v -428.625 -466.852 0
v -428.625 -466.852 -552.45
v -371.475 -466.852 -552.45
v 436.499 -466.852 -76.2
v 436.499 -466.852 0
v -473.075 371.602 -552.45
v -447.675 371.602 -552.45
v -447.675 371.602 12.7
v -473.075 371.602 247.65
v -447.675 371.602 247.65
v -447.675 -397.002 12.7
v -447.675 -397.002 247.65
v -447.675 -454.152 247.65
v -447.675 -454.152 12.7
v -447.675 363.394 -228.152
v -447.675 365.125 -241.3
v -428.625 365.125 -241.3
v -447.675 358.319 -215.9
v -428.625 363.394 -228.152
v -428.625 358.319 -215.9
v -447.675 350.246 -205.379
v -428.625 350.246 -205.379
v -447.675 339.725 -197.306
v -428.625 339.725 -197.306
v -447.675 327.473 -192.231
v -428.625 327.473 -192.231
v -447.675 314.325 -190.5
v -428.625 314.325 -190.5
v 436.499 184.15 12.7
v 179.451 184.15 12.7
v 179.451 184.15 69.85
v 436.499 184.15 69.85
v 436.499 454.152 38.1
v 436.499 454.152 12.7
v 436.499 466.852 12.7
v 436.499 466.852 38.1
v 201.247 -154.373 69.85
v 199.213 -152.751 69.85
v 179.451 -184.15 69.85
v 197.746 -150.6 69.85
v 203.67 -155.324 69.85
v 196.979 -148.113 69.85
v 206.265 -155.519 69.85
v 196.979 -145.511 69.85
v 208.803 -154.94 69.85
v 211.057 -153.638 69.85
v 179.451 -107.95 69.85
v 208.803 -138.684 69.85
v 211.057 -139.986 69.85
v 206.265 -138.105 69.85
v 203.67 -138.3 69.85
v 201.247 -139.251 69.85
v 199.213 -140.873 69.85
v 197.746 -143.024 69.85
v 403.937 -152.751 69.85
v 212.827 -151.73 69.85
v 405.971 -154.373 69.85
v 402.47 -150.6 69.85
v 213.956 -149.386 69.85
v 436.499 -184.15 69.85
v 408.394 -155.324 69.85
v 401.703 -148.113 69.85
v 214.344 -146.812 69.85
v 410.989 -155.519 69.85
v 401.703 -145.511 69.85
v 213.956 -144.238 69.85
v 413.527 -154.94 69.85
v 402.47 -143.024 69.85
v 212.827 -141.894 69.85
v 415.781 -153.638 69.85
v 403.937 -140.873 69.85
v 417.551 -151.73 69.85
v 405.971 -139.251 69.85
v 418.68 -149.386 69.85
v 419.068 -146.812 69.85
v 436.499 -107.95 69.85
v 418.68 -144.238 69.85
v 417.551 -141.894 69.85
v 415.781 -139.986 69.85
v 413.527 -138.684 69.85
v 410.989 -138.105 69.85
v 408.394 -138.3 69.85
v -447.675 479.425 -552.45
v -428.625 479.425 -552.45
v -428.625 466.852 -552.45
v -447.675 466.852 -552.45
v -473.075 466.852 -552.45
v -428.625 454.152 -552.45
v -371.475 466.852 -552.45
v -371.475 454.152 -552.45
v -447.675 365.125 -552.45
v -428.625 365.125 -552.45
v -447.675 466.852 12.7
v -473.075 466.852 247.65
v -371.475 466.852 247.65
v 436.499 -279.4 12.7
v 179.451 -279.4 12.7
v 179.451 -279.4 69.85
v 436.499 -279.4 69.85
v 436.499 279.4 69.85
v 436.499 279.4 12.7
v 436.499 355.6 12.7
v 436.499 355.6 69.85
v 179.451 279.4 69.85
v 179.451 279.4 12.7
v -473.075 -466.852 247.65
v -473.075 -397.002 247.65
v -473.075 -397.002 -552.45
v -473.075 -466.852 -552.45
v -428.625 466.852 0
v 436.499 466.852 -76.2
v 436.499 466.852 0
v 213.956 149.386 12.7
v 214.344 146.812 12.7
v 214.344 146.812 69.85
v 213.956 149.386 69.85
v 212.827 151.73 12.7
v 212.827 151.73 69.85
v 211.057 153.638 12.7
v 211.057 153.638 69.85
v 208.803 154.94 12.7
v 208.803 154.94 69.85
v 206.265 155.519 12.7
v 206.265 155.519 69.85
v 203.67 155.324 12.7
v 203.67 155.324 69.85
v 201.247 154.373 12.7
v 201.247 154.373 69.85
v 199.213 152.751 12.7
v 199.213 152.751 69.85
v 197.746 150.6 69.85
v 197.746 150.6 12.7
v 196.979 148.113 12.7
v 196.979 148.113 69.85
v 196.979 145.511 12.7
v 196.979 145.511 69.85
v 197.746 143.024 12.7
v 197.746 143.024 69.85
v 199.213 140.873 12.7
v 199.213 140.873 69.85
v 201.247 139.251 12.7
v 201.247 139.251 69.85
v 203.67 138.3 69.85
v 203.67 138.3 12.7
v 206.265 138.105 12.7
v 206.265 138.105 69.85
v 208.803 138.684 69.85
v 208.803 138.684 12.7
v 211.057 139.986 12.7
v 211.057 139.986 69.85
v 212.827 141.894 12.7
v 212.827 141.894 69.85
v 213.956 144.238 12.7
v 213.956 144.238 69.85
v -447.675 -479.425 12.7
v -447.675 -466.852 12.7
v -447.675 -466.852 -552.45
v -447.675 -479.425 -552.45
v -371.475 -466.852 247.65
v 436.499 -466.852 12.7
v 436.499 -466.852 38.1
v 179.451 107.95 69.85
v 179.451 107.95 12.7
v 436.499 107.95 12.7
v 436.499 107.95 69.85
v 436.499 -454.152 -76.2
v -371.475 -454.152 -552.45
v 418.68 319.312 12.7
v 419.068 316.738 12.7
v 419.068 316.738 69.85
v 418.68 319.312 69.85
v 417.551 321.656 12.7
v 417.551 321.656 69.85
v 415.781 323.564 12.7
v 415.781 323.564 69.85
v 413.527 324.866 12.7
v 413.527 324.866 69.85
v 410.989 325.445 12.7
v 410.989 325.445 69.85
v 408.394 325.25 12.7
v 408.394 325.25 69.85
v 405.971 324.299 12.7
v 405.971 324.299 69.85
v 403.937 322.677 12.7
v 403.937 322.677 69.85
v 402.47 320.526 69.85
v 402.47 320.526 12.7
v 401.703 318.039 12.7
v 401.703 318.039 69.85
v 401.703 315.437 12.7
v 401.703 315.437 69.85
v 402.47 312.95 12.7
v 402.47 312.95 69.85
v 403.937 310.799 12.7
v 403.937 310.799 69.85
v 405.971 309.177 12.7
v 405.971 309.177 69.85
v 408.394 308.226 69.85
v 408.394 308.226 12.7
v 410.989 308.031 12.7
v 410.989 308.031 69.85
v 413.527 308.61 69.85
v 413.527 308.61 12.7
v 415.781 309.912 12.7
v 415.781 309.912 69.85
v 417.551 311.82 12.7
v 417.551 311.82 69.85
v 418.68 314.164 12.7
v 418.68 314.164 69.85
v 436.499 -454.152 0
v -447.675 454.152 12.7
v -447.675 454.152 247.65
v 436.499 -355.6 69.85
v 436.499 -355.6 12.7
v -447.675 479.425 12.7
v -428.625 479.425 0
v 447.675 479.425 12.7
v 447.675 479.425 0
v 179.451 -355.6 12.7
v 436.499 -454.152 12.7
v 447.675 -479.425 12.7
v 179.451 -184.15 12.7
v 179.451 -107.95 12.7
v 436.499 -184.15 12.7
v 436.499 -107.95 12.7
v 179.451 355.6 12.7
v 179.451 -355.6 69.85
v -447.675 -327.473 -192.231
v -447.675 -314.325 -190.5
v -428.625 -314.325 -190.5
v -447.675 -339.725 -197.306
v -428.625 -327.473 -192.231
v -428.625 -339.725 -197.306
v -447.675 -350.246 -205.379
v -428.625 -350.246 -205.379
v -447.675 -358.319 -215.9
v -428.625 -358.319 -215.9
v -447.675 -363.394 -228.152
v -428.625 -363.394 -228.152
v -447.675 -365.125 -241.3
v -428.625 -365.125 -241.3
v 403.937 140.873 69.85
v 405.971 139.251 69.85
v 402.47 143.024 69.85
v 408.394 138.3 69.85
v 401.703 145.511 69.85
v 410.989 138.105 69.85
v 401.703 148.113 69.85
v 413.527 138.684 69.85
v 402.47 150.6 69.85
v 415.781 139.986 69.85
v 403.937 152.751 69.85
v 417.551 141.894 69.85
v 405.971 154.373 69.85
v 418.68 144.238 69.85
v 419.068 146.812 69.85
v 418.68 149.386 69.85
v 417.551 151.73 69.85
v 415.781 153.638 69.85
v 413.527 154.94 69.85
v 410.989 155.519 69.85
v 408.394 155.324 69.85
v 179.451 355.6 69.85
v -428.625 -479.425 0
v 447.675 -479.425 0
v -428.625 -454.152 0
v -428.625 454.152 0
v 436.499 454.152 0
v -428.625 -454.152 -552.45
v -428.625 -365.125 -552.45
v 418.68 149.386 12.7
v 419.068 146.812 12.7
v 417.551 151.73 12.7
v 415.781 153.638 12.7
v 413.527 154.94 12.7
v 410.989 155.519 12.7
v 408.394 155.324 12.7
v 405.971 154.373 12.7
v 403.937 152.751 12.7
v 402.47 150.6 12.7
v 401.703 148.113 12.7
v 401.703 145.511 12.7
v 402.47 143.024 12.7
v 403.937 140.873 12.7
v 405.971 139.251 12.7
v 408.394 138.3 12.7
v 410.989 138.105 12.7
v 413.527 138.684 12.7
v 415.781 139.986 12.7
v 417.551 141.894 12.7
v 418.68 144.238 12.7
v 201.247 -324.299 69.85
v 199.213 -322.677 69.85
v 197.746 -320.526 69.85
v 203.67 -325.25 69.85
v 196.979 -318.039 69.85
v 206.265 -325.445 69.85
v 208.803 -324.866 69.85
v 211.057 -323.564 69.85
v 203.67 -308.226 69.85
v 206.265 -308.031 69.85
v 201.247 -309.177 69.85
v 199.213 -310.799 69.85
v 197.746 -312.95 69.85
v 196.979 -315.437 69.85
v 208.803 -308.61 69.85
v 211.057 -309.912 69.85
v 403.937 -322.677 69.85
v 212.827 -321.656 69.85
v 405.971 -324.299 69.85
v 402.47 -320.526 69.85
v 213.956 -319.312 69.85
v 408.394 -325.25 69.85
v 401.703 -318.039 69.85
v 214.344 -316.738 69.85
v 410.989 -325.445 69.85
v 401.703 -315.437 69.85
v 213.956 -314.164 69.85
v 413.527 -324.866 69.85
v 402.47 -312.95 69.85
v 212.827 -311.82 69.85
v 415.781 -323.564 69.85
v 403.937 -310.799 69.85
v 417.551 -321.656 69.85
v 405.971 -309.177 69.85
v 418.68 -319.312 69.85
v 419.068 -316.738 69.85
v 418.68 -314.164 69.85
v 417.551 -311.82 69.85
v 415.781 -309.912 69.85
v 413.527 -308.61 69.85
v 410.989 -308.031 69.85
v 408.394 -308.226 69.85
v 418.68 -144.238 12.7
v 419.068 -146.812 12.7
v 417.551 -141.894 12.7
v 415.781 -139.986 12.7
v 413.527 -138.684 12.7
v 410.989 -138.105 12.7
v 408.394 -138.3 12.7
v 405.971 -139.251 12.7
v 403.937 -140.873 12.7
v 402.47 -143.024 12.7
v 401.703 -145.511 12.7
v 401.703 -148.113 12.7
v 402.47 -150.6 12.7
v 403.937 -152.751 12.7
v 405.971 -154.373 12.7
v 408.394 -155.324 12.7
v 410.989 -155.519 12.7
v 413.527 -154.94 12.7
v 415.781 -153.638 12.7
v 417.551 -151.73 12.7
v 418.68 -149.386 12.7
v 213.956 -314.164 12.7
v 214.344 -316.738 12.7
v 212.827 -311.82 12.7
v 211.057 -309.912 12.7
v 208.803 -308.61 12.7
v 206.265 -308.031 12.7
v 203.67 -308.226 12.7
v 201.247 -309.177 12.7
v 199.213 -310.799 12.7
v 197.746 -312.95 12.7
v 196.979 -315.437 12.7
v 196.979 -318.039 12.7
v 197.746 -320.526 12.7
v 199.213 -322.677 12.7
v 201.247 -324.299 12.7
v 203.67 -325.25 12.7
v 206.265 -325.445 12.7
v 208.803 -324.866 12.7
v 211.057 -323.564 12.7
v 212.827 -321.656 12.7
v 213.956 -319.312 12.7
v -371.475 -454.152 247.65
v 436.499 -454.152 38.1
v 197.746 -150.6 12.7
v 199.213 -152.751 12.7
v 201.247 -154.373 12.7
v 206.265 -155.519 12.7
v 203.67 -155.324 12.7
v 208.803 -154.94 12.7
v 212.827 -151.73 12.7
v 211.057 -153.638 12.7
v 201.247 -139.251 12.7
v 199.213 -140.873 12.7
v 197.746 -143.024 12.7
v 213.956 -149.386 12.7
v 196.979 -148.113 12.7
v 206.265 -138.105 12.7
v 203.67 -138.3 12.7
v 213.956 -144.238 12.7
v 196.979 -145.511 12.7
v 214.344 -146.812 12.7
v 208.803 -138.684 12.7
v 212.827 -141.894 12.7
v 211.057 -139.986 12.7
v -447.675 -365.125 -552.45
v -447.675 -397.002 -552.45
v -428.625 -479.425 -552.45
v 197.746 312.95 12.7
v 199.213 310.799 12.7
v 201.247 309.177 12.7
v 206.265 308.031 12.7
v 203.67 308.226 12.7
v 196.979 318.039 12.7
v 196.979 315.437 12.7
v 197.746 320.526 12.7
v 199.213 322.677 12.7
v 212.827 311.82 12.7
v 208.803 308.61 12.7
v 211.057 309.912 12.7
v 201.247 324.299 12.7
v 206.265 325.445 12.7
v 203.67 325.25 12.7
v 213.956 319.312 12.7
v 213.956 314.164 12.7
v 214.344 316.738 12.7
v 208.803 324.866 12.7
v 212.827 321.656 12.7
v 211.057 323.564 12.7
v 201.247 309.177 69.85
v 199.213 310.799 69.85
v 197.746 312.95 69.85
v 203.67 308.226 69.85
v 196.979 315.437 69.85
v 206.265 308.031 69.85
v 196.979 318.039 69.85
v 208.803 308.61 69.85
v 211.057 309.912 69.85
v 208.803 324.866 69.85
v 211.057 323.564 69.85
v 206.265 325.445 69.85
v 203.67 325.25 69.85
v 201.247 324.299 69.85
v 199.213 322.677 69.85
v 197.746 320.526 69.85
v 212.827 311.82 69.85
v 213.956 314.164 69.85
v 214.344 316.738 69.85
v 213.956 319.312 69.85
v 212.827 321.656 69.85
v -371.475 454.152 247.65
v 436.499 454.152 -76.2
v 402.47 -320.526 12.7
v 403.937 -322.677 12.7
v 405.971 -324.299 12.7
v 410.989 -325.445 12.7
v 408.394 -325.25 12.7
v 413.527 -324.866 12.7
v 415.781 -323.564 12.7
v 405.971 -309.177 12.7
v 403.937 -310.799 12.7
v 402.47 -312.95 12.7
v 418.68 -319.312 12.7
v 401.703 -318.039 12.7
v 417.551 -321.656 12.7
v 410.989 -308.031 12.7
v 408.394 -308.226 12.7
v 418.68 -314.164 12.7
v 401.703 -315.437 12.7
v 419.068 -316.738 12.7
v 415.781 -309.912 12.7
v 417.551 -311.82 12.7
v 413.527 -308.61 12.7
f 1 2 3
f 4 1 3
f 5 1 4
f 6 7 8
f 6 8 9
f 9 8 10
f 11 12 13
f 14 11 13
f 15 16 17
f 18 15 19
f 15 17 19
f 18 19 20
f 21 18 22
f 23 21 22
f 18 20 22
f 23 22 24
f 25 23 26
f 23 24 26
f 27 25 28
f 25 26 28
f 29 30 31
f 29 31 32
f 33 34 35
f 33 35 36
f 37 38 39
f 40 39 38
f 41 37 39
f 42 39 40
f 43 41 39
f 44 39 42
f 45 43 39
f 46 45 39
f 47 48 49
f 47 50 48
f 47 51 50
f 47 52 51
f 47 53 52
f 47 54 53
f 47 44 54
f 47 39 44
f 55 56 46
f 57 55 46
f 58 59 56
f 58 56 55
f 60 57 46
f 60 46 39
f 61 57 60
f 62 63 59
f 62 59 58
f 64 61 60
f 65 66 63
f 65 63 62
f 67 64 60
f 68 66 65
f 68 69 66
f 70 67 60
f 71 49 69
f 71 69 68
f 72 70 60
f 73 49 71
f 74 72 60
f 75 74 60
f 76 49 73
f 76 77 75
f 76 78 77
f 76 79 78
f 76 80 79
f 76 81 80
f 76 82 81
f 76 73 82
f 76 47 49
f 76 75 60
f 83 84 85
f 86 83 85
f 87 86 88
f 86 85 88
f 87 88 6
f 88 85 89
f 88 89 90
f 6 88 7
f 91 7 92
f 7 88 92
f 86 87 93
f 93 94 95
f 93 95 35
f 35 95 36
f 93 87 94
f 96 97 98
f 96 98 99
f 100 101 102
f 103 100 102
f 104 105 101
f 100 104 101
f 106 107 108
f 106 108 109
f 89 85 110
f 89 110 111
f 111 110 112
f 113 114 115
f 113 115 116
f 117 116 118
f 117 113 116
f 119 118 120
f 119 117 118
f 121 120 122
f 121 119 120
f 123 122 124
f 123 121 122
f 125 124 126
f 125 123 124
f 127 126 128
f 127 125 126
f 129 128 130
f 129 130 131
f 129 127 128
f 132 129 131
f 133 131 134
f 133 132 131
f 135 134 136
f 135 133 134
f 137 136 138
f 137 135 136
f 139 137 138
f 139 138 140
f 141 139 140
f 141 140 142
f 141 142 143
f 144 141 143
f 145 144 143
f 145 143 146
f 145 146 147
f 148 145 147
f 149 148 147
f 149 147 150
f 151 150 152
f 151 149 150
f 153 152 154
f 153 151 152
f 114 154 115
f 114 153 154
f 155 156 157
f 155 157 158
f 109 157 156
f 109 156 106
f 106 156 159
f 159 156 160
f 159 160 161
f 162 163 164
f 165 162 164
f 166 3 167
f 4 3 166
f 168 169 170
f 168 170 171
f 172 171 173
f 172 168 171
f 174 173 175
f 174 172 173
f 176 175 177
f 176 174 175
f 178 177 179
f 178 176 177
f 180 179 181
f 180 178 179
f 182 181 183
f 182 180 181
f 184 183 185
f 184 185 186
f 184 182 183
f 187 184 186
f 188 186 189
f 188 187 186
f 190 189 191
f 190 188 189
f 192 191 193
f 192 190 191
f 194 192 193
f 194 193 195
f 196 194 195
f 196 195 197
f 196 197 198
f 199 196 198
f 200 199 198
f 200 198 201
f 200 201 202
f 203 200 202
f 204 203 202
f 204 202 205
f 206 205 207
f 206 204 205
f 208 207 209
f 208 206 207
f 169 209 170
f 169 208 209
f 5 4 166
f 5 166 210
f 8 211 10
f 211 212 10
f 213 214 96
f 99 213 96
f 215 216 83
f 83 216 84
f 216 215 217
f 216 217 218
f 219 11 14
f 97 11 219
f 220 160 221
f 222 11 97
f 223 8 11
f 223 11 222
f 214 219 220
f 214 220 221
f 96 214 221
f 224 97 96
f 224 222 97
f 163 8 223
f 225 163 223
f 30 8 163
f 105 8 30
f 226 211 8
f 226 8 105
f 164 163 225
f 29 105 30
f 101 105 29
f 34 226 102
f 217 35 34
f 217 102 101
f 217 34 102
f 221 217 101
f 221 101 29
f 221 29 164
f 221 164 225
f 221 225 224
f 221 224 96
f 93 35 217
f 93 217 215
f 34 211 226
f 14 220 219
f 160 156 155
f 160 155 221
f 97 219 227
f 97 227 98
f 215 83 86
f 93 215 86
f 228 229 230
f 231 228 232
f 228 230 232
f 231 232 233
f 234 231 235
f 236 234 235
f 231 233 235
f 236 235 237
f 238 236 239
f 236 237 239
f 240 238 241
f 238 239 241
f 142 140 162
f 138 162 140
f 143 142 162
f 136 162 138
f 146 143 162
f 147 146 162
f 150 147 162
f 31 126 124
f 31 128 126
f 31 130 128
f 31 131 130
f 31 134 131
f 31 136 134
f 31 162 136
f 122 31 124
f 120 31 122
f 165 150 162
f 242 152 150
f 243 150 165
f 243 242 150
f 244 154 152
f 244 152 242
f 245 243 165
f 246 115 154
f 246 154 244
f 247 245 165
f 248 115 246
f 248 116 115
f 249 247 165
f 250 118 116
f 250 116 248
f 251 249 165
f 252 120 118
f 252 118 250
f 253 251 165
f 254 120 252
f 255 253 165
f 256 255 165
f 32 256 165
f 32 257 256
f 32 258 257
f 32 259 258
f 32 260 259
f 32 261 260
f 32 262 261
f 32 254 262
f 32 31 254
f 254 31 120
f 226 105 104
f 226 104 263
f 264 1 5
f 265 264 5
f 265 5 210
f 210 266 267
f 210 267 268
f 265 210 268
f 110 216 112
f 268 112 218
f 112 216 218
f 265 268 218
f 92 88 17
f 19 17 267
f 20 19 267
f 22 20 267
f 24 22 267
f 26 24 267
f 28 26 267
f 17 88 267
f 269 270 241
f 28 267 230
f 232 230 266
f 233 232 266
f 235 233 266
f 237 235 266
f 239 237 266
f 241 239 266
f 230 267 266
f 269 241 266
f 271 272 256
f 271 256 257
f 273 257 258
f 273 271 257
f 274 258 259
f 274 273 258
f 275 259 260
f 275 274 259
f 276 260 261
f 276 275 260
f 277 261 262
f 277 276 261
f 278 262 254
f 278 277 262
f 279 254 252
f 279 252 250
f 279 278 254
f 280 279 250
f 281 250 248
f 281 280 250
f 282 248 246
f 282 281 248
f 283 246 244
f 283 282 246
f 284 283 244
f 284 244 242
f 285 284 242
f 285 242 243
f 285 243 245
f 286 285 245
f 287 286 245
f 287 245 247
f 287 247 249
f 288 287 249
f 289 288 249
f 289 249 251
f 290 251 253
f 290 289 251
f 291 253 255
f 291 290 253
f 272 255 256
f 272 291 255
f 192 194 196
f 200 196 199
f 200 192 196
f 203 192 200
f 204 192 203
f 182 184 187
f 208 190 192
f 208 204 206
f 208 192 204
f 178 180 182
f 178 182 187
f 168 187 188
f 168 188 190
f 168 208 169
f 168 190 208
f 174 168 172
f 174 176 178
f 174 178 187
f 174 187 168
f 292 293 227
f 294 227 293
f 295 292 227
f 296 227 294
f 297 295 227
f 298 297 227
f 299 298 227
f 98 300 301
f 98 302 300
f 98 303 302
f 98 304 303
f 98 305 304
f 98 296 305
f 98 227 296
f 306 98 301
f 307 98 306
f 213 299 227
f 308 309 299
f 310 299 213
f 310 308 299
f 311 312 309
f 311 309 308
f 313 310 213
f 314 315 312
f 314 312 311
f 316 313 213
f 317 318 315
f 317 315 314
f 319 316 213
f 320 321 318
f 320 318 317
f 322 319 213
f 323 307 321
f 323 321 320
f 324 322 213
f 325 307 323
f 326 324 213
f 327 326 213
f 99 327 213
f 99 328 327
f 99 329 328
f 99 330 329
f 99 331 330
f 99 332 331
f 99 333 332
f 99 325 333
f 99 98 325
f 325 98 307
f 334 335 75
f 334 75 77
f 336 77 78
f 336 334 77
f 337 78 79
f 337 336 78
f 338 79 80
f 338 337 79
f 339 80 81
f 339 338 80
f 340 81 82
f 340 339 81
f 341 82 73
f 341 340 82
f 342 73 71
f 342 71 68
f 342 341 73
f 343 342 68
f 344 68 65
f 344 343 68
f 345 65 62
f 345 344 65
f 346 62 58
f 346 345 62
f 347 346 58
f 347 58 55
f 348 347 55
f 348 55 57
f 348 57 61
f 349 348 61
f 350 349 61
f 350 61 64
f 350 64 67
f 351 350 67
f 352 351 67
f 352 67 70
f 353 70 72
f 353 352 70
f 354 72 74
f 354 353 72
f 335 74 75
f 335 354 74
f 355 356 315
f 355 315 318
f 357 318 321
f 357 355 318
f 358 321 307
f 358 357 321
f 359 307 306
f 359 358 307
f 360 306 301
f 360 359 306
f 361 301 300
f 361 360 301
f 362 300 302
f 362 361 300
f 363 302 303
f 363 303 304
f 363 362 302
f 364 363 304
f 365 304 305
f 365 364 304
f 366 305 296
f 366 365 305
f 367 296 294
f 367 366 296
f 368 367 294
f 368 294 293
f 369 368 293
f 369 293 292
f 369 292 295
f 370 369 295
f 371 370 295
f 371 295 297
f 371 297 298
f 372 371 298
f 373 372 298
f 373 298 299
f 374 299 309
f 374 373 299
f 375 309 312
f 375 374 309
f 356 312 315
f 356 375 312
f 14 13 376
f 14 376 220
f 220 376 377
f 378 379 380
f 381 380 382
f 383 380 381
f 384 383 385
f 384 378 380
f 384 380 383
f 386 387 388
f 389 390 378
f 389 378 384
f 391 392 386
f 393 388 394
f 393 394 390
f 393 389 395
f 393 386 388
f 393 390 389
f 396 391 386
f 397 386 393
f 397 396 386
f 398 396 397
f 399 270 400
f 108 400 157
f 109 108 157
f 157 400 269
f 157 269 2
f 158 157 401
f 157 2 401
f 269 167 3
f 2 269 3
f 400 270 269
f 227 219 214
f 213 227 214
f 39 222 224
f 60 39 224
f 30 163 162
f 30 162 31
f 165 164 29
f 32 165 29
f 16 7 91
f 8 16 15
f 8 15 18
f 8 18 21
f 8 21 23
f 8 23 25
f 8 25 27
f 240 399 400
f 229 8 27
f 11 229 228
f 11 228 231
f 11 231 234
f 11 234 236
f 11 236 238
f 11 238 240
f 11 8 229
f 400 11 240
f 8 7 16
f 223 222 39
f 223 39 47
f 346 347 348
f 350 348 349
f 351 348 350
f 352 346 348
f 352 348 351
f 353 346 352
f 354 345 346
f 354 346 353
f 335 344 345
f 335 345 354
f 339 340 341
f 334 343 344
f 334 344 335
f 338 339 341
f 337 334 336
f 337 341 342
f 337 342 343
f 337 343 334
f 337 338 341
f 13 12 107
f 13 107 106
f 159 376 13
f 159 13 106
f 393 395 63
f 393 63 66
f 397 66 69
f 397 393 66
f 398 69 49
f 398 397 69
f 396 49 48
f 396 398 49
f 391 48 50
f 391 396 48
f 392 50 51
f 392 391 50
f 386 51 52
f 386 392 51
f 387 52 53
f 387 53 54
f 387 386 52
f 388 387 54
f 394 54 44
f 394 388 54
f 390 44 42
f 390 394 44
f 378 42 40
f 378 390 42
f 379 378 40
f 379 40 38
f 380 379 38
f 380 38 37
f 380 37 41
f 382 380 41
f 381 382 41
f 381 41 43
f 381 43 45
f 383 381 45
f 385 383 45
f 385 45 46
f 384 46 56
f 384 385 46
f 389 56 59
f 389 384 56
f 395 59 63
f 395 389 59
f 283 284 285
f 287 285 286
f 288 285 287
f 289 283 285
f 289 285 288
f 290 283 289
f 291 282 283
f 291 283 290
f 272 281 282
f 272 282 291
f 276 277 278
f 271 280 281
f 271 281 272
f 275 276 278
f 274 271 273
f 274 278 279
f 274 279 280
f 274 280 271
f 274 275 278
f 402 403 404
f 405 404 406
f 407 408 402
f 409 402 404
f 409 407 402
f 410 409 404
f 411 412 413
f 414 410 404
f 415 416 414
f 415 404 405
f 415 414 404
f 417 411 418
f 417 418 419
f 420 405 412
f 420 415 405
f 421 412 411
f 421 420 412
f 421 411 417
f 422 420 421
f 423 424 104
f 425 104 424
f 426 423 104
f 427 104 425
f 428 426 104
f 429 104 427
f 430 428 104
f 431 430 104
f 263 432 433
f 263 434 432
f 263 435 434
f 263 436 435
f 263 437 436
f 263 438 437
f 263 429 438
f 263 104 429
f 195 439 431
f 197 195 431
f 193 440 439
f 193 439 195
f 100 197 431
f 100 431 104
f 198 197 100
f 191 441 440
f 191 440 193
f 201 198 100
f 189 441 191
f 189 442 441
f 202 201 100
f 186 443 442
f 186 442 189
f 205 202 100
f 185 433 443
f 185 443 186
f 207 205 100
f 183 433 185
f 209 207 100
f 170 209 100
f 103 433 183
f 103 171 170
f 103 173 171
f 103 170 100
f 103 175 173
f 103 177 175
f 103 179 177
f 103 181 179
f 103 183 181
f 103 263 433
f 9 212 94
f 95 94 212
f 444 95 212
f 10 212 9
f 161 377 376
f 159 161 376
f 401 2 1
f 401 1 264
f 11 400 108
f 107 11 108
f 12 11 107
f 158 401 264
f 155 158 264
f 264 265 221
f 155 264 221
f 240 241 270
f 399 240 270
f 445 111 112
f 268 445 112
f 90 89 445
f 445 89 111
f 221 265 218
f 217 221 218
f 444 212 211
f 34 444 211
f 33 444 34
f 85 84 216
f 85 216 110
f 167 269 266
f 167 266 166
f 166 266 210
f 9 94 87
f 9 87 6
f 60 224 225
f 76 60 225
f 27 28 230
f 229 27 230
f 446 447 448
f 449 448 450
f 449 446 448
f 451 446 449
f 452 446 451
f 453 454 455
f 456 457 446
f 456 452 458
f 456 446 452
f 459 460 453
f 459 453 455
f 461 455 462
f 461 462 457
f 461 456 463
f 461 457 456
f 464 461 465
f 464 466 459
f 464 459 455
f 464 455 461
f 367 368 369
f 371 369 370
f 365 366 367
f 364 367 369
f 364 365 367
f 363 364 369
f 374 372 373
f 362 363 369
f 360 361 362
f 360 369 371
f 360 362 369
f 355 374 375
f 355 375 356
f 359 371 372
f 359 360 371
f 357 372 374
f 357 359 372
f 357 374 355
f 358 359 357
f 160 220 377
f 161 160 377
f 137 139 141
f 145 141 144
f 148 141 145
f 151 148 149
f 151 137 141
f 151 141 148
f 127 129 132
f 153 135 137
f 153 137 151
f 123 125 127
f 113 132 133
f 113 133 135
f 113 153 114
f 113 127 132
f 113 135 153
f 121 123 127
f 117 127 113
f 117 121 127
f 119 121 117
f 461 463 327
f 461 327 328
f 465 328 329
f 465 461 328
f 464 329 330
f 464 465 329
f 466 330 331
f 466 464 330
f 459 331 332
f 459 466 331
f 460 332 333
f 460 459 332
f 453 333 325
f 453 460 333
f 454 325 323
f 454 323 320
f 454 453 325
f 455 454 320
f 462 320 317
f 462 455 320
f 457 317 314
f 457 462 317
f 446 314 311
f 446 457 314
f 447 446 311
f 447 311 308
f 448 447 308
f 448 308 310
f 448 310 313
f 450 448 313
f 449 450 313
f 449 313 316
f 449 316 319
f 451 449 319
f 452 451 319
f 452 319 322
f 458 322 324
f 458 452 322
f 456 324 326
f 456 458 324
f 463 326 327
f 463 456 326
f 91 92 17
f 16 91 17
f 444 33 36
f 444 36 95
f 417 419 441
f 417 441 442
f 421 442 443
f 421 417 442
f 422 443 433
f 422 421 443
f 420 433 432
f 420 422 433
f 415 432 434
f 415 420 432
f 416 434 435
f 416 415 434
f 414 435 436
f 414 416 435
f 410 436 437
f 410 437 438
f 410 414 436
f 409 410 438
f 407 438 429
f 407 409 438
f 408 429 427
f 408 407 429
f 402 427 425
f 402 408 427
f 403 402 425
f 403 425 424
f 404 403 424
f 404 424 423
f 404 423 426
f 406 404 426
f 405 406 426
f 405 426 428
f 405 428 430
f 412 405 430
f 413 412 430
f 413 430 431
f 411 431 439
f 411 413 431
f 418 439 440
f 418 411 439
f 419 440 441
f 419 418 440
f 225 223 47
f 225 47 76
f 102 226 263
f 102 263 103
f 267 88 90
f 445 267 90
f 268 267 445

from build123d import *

# Parameters (mm, degrees)
F0_W      = 895.35
F0_H      = 958.85
F1_DEPTH  = 12.7
F2_W      = 257.048
F2_H      = 76.2
F2_R      = 8.73125
F3_DEPTH  = 57.15
F6_DEPTH  = 12.7
F8_DEPTH  = 12.7
F9_W      = 19.05
F9_H      = 552.45
F10_DEPTH = 946.278
F13_DEPTH = 19.05
F14_W     = 69.85
F14_H     = 800.1
F14_W_2   = 95.25
F15_DEPTH = 25.4


with BuildPart() as f1:
    # F0 (on Top) → F1 (new body)
    with BuildSketch(Plane.XY):
        Rectangle(F0_W, F0_H)
    extrude(amount=F1_DEPTH)

    # F2 (on face) → F3 (join)
    with BuildSketch(Plane.XY.offset(12.7)):
        with Locations((307.975, -146.05)):
            Rectangle(F2_W, F2_H)
        with Locations((205.613, -146.812)):
            Circle(F2_R, mode=Mode.SUBTRACT)
        with Locations((410.337, -146.812)):
            Circle(F2_R, mode=Mode.SUBTRACT)
        with Locations((307.975, -317.5)):
            Rectangle(F2_W, F2_H)
        with Locations((205.613, -316.738)):
            Circle(F2_R, mode=Mode.SUBTRACT)
        with Locations((410.337, -316.738)):
            Circle(F2_R, mode=Mode.SUBTRACT)
        with Locations((307.975, 146.05)):
            Rectangle(F2_W, F2_H)
        with Locations((205.613, 146.812)):
            Circle(F2_R, mode=Mode.SUBTRACT)
        with Locations((410.337, 146.812)):
            Circle(F2_R, mode=Mode.SUBTRACT)
        with Locations((307.975, 317.5)):
            Rectangle(F2_W, F2_H)
        with Locations((205.613, 316.738)):
            Circle(F2_R, mode=Mode.SUBTRACT)
        with Locations((410.337, 316.738)):
            Circle(F2_R, mode=Mode.SUBTRACT)
    extrude(amount=F3_DEPTH)

    # F5 (on offset) → F6 (join)
    with BuildSketch(Plane.XZ.offset(454.152)):
        Polygon((-447.675, 247.65), (-447.675, 12.7), (436.499, 12.7), (436.499, 38.1), (-371.475, 247.65), align=None)
    extrude(amount=F6_DEPTH)

    # F7 (on face) → F8 (join)
    with BuildSketch(Plane.XZ.offset(466.852)):
        Polygon((436.499, -76.2), (436.499, 0), (-447.675, 0), (-447.675, -552.45), (-371.475, -552.45), align=None)
    extrude(amount=-F8_DEPTH)

    # F9 (on face) → F10 (cut, through all)
    with BuildSketch(Plane.XZ.offset(466.852)):
        with Locations((-438.15, -276.225)):
            Rectangle(F9_W, F9_H)
    extrude(amount=-F10_DEPTH, mode=Mode.SUBTRACT)

    # F11: F1 across plane


with BuildPart() as f1_1:
    add(f1.part)
    add(f1.part.mirror(Plane.XZ))

    # F12 (on face) → F13 (join)
    with BuildSketch(Plane(origin=(-428.625, 0, 0), x_dir=(0, -1, 0), z_dir=(-1, 0, 0))):
        with BuildLine():
            Line((479.425, -552.45), (479.425, 0))
            Line((479.425, 0), (-479.425, 0))
            Line((-479.425, 0), (-479.425, -552.45))
            Line((-479.425, -552.45), (-365.125, -552.45))
            Line((-365.125, -552.45), (-365.125, -241.3))
            ThreePointArc((-365.125, -241.3), (-350.2460244843, -205.3789755157), (-314.325, -190.5))
            Line((-314.325, -190.5), (314.325, -190.5))
            ThreePointArc((314.325, -190.5), (350.2460244843, -205.3789755157), (365.125, -241.3))
            Line((365.125, -241.3), (365.125, -552.45))
            Line((365.125, -552.45), (479.425, -552.45))
        make_face()
    extrude(amount=F13_DEPTH)

    # F14 (on face) → F15 (join)
    with BuildSketch(Plane(origin=(-447.675, 0, 0), x_dir=(0, -1, 0), z_dir=(-1, 0, 0))):
        with Locations((431.927, -152.4)):
            Rectangle(F14_W, F14_H)
        with Locations((-419.227, -152.4)):
            Rectangle(F14_W_2, F14_H)
    extrude(amount=F15_DEPTH)


solid = f1_1.part
